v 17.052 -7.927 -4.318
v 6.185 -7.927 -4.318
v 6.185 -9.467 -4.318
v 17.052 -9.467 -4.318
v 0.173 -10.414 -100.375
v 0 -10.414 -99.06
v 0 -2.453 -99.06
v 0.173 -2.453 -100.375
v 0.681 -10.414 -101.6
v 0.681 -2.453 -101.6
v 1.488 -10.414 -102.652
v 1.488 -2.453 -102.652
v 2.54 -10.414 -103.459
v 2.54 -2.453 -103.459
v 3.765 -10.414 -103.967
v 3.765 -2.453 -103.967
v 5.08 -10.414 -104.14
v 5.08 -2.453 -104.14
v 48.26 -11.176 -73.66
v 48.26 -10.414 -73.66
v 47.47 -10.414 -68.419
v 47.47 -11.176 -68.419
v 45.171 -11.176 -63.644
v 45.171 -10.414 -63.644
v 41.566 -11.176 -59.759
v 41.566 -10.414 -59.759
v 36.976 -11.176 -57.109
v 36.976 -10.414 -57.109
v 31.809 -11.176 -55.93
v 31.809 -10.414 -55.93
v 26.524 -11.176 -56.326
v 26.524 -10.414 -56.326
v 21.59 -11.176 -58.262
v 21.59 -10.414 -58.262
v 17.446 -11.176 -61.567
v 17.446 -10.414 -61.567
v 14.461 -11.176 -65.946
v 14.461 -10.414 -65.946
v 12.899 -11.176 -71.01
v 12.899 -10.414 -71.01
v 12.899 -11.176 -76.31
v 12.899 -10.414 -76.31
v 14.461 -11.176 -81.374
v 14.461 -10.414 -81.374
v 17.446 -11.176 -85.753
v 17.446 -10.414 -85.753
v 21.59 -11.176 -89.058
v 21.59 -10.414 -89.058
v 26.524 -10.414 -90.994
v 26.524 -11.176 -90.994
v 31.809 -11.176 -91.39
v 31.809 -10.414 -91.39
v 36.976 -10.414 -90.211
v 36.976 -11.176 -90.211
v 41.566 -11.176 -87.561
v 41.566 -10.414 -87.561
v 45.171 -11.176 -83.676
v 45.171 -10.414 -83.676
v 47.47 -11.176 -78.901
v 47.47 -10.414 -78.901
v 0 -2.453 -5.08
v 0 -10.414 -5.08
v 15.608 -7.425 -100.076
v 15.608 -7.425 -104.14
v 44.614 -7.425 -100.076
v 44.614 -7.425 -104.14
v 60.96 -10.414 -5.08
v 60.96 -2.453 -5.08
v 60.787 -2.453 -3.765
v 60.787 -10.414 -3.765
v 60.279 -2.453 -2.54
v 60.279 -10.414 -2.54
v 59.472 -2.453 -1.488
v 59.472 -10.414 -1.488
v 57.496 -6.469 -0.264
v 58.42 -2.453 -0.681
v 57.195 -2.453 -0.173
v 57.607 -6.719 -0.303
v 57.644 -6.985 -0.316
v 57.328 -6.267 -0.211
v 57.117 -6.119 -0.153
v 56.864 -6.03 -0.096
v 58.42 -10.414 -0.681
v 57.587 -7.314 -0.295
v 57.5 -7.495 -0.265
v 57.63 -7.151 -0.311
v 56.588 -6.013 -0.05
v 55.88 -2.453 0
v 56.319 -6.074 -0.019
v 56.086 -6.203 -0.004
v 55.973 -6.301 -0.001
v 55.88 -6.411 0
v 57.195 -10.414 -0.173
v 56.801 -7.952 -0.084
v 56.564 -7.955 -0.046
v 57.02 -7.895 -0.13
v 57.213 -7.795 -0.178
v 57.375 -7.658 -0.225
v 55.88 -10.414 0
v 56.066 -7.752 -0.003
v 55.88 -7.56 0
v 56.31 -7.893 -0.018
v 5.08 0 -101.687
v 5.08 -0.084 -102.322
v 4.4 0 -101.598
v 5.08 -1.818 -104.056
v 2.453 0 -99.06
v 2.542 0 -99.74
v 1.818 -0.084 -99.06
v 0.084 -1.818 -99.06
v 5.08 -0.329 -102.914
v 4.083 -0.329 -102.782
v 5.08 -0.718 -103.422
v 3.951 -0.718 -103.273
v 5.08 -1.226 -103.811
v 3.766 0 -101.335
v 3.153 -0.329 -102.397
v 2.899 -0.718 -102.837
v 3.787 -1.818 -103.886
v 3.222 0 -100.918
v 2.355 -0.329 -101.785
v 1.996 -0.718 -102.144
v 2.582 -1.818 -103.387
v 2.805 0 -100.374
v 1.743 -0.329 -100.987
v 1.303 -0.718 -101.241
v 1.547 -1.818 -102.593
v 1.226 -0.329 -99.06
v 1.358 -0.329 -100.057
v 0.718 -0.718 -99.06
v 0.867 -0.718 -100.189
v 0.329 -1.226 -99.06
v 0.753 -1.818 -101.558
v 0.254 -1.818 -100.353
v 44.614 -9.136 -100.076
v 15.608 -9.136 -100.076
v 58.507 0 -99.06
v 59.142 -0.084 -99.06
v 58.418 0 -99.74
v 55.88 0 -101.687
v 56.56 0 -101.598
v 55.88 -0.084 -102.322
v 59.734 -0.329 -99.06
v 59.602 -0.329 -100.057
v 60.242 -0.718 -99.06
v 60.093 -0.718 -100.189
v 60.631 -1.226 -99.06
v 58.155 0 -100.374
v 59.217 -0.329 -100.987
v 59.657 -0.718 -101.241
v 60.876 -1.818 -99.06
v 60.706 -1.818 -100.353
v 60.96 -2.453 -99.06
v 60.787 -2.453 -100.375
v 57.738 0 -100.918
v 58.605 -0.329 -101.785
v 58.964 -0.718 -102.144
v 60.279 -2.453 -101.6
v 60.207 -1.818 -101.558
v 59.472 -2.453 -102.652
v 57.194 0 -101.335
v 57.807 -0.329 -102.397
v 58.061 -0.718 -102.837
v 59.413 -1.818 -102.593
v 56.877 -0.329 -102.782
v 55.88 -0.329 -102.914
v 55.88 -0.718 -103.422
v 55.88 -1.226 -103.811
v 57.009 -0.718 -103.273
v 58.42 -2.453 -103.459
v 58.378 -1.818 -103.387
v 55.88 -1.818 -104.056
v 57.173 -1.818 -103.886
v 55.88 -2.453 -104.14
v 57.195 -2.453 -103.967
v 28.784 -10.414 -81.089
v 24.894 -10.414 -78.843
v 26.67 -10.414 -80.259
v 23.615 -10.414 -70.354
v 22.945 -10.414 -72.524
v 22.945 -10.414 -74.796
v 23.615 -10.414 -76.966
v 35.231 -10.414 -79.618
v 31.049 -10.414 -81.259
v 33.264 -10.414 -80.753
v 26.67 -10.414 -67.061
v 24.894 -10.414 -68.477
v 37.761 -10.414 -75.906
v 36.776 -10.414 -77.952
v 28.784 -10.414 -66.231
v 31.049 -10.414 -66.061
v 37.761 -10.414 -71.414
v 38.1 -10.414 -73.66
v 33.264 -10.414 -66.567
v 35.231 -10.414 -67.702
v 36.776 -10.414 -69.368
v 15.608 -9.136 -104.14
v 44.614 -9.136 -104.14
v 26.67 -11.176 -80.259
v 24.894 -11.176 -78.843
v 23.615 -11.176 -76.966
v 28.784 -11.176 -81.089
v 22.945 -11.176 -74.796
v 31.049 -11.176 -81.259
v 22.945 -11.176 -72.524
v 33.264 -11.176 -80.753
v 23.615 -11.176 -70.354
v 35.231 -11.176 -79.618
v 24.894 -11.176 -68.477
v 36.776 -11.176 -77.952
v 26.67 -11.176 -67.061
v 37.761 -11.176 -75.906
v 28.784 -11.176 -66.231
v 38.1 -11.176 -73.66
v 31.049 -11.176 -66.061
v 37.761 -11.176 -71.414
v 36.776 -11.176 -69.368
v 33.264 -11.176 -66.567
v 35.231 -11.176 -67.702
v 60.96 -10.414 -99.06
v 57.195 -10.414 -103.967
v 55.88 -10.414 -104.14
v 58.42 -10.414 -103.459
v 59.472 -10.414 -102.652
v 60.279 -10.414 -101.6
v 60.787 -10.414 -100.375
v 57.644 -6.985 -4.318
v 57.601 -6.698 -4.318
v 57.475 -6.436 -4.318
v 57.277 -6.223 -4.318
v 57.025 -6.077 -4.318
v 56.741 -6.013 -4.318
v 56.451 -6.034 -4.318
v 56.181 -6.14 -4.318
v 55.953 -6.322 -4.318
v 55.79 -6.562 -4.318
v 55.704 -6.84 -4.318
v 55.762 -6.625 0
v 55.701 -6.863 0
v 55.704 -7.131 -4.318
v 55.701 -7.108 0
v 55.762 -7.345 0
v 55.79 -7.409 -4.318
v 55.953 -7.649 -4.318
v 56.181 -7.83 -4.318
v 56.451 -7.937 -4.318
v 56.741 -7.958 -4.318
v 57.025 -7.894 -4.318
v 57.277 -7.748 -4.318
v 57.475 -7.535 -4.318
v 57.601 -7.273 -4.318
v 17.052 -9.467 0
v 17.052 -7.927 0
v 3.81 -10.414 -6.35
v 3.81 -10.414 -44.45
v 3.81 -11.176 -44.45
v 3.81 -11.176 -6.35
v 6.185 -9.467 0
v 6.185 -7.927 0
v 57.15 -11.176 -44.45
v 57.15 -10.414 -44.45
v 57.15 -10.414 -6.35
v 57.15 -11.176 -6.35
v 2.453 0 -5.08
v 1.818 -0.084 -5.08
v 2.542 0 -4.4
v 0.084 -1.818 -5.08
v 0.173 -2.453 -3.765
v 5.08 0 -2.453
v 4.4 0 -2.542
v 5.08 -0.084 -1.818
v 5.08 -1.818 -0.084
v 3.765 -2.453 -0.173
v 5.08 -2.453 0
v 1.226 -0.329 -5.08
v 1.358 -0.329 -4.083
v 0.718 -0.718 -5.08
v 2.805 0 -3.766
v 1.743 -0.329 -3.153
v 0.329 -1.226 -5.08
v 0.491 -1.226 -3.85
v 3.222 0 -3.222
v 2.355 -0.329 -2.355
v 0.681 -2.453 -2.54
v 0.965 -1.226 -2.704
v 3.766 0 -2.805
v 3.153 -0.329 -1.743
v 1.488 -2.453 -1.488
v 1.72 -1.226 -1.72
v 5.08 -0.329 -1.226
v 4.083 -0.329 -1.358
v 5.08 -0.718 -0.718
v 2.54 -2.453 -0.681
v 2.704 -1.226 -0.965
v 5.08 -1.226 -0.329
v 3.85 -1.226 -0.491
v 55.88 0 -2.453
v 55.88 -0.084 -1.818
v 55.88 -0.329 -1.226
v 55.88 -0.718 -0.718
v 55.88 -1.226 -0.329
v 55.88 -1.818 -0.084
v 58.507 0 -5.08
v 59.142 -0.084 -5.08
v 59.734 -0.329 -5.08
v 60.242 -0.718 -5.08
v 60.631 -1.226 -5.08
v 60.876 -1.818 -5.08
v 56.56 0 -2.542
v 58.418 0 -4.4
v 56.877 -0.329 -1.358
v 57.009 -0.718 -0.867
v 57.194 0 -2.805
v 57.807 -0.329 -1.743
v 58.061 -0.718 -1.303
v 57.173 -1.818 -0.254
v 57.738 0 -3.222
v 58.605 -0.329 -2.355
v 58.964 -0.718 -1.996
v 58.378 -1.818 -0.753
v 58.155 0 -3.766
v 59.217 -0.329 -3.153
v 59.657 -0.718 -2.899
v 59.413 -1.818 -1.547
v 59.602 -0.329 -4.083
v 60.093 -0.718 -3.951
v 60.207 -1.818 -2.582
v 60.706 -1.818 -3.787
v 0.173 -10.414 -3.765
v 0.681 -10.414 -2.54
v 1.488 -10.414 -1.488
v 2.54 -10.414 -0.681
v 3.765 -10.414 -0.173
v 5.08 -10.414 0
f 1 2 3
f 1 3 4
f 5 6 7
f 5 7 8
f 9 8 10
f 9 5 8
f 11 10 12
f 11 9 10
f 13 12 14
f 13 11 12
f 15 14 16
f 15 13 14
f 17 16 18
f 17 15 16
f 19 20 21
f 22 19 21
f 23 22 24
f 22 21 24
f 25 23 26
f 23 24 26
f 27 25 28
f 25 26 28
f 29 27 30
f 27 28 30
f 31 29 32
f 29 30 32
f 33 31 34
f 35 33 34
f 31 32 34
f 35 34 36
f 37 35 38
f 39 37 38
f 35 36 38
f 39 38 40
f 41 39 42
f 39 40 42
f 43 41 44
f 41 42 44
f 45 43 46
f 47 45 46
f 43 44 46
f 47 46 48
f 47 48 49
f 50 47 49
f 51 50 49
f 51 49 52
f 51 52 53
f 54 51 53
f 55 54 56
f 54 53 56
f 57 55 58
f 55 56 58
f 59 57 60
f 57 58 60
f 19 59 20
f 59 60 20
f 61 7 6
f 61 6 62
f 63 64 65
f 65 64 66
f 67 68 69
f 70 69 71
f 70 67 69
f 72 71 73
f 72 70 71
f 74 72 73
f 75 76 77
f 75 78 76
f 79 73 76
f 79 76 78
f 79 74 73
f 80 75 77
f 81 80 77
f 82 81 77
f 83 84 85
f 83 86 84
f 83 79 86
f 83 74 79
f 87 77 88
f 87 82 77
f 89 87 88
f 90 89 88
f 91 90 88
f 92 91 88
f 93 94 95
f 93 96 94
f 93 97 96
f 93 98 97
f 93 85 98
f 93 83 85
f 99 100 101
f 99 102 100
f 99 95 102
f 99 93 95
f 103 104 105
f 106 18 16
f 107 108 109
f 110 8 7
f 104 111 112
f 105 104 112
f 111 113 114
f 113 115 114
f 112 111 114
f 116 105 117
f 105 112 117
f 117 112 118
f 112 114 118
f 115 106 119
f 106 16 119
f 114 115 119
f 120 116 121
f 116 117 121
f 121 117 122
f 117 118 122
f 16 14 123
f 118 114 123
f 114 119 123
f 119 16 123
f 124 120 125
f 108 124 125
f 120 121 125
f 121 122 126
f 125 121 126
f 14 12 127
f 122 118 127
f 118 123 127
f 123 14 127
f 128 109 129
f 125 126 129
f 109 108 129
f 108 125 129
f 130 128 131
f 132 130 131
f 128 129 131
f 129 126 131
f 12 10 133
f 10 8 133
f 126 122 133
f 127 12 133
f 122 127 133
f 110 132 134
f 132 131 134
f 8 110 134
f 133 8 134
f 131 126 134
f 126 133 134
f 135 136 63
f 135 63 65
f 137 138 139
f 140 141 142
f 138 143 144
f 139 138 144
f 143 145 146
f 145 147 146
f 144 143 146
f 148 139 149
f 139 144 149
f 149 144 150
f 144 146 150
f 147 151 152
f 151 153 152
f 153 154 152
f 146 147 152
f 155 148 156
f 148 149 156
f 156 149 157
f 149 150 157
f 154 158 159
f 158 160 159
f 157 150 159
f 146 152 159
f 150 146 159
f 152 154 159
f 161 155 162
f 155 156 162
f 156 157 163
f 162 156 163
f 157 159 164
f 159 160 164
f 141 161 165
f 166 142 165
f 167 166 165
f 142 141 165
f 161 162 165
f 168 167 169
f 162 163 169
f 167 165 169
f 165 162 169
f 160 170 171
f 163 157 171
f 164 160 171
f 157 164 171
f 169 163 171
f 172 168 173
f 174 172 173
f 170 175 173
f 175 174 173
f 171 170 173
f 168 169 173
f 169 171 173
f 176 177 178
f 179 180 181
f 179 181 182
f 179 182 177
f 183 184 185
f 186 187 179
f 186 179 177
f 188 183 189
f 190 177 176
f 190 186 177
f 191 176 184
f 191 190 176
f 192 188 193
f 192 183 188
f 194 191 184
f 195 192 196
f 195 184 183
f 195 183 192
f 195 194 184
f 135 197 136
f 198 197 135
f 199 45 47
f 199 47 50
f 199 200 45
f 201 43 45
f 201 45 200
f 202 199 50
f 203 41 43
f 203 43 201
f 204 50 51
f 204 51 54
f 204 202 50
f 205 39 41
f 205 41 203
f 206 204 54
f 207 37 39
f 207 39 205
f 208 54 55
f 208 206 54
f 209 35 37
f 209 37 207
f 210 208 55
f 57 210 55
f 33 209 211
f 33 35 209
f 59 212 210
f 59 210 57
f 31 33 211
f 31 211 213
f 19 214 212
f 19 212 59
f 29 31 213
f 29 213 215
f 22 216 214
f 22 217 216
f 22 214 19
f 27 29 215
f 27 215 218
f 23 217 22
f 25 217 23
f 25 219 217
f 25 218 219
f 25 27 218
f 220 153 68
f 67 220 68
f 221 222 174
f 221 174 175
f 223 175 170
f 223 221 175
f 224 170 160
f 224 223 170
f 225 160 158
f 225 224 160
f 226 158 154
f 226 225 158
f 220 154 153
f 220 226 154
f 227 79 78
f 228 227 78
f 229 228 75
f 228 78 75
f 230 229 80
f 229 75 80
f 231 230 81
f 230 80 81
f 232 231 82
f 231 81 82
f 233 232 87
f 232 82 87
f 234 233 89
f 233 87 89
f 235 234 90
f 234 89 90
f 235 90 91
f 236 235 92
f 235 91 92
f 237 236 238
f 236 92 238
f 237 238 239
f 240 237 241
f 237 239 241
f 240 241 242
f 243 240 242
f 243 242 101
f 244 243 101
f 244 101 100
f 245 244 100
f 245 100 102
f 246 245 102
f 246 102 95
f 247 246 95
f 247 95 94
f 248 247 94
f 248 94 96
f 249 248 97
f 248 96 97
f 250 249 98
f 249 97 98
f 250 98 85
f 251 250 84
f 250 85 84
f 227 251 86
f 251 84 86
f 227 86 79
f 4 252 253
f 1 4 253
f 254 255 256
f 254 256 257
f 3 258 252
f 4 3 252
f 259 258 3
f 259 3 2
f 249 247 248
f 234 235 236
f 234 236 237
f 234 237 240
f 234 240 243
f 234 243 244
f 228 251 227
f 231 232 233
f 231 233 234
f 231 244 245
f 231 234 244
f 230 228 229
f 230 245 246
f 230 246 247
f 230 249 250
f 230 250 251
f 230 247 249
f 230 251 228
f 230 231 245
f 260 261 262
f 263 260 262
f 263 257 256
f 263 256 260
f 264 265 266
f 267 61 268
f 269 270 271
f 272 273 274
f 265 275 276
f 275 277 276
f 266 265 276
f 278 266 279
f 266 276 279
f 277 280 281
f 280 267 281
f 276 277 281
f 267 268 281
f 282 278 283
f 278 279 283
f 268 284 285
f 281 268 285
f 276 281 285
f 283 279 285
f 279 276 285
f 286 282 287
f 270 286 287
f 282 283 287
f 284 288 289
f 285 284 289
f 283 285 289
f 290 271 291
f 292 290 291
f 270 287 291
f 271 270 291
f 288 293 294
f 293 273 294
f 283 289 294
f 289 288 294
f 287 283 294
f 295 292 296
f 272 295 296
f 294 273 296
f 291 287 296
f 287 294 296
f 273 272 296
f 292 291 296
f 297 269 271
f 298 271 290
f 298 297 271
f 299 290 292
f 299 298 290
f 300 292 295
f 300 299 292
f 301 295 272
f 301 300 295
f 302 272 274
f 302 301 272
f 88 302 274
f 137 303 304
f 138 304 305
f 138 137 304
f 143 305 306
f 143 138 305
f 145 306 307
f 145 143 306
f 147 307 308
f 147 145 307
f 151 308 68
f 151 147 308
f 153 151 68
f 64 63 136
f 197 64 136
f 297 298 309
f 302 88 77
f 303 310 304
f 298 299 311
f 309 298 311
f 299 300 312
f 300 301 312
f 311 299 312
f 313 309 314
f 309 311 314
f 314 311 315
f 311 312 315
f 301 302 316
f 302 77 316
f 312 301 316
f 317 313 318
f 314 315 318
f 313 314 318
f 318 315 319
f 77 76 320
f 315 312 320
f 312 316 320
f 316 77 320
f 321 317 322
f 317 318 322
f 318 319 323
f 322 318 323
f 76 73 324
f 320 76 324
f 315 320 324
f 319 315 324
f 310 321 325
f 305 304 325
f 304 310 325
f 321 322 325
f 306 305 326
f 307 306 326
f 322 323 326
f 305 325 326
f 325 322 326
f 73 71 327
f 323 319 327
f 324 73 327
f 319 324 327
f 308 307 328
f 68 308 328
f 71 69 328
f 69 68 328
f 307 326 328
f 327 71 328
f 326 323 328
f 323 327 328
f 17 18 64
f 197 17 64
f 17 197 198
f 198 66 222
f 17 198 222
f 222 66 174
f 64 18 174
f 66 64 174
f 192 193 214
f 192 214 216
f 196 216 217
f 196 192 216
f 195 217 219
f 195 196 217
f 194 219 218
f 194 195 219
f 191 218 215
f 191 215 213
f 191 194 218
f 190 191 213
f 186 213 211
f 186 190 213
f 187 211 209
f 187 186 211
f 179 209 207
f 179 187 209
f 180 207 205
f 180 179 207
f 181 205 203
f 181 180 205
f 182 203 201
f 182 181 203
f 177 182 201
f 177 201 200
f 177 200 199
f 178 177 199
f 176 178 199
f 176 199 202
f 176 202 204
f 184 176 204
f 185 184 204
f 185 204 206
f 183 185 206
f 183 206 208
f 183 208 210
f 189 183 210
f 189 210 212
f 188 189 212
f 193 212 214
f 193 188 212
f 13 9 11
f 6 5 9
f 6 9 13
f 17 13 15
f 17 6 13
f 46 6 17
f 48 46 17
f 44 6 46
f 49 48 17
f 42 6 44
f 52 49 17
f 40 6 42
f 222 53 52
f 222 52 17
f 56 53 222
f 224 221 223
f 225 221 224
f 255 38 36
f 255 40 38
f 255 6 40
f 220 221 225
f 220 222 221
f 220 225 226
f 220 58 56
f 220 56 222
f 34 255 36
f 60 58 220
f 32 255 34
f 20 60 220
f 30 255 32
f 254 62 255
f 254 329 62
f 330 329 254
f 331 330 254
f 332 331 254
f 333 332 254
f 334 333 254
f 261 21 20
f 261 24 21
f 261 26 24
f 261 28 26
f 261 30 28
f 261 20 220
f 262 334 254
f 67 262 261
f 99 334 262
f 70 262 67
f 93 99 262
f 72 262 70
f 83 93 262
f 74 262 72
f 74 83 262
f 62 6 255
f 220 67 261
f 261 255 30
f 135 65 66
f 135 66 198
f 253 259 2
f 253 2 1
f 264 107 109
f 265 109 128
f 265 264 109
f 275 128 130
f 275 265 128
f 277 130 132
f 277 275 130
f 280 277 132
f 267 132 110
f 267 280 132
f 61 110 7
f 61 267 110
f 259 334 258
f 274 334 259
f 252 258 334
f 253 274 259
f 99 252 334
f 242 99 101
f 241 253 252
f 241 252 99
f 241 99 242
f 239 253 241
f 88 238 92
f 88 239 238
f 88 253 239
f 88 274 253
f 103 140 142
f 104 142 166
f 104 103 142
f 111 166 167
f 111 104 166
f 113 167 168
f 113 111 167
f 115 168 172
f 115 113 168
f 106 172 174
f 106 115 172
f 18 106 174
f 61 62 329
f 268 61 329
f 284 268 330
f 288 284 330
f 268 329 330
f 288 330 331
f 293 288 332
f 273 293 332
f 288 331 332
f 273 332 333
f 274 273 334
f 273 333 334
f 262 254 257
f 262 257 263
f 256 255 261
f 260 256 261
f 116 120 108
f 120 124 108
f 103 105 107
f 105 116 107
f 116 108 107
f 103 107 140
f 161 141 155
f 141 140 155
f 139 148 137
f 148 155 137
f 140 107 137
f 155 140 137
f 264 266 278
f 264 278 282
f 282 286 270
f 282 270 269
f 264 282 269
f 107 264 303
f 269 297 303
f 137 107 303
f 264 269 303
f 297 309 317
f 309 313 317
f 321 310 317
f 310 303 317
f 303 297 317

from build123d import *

# Parameters (mm, degrees)
F0_W      = 60.96
F0_H      = 104.14
F1_DEPTH  = 10.414
F2_R      = 5.08
F3_W      = 53.34
F3_H      = 38.1
F3_R      = 17.78
F3_R_2    = 7.62
F4_DEPTH  = 0.762
F5_R      = 2.4528409794
F7_R      = 0.9755927776
F7_W      = 10.8667761087
F7_H      = 1.5401728451
F8_DEPTH  = 4.318
F9_W      = 29.0065901354
F9_H      = 1.7113029025
F10_DEPTH = 4.064


with BuildPart() as f1:
    # F0 (on Front) → F1 (new body)
    with BuildSketch(Plane.XZ):
        with Locations((30.48, -52.07)):
            Rectangle(F0_W, F0_H)
    extrude(amount=F1_DEPTH)

    # F2
    f2_edges = [f1.edges().sort_by_distance(p)[0] for p in [
        (60.96, -5.207, 0),
        (0, -5.207, 0),
        (0, -5.207, -104.14),
        (60.96, -5.207, -104.14),
    ]]
    fillet(f2_edges, radius=F2_R)

    # F3 (on face) → F4 (join)
    with BuildSketch(Plane.XZ.offset(10.414)):
        with Locations((30.48, -25.4)):
            Rectangle(F3_W, F3_H)
        with Locations((30.48, -73.66)):
            Circle(F3_R)
        with Locations((30.48, -73.66)):
            Circle(F3_R_2, mode=Mode.SUBTRACT)
    extrude(amount=F4_DEPTH)

    # F5
    f5_edges = [f1.edges().sort_by_distance(p)[0] for p in [
        (1.487898, 0, -1.487898),
    ]]
    fillet(f5_edges, radius=F5_R)

    # F7 (on face) → F8 (cut)
    with BuildSketch(Plane.XY):
        with Locations((56.6684938967, -6.9853682071)):
            Circle(F7_R)
        with Locations((11.6184335202, -8.6966715753)):
            Rectangle(F7_W, F7_H)
    extrude(amount=-F8_DEPTH, mode=Mode.SUBTRACT)

    # F9 (on face) → F10 (cut)
    with BuildSketch(Plane(origin=(0, 0, -104.14), x_dir=(1, 0, 0), z_dir=(0, 0, -1))):
        with Locations((30.1111503504, 8.2802635152)):
            Rectangle(F9_W, F9_H)
    extrude(amount=-F10_DEPTH, mode=Mode.SUBTRACT)


solid = f1.part
